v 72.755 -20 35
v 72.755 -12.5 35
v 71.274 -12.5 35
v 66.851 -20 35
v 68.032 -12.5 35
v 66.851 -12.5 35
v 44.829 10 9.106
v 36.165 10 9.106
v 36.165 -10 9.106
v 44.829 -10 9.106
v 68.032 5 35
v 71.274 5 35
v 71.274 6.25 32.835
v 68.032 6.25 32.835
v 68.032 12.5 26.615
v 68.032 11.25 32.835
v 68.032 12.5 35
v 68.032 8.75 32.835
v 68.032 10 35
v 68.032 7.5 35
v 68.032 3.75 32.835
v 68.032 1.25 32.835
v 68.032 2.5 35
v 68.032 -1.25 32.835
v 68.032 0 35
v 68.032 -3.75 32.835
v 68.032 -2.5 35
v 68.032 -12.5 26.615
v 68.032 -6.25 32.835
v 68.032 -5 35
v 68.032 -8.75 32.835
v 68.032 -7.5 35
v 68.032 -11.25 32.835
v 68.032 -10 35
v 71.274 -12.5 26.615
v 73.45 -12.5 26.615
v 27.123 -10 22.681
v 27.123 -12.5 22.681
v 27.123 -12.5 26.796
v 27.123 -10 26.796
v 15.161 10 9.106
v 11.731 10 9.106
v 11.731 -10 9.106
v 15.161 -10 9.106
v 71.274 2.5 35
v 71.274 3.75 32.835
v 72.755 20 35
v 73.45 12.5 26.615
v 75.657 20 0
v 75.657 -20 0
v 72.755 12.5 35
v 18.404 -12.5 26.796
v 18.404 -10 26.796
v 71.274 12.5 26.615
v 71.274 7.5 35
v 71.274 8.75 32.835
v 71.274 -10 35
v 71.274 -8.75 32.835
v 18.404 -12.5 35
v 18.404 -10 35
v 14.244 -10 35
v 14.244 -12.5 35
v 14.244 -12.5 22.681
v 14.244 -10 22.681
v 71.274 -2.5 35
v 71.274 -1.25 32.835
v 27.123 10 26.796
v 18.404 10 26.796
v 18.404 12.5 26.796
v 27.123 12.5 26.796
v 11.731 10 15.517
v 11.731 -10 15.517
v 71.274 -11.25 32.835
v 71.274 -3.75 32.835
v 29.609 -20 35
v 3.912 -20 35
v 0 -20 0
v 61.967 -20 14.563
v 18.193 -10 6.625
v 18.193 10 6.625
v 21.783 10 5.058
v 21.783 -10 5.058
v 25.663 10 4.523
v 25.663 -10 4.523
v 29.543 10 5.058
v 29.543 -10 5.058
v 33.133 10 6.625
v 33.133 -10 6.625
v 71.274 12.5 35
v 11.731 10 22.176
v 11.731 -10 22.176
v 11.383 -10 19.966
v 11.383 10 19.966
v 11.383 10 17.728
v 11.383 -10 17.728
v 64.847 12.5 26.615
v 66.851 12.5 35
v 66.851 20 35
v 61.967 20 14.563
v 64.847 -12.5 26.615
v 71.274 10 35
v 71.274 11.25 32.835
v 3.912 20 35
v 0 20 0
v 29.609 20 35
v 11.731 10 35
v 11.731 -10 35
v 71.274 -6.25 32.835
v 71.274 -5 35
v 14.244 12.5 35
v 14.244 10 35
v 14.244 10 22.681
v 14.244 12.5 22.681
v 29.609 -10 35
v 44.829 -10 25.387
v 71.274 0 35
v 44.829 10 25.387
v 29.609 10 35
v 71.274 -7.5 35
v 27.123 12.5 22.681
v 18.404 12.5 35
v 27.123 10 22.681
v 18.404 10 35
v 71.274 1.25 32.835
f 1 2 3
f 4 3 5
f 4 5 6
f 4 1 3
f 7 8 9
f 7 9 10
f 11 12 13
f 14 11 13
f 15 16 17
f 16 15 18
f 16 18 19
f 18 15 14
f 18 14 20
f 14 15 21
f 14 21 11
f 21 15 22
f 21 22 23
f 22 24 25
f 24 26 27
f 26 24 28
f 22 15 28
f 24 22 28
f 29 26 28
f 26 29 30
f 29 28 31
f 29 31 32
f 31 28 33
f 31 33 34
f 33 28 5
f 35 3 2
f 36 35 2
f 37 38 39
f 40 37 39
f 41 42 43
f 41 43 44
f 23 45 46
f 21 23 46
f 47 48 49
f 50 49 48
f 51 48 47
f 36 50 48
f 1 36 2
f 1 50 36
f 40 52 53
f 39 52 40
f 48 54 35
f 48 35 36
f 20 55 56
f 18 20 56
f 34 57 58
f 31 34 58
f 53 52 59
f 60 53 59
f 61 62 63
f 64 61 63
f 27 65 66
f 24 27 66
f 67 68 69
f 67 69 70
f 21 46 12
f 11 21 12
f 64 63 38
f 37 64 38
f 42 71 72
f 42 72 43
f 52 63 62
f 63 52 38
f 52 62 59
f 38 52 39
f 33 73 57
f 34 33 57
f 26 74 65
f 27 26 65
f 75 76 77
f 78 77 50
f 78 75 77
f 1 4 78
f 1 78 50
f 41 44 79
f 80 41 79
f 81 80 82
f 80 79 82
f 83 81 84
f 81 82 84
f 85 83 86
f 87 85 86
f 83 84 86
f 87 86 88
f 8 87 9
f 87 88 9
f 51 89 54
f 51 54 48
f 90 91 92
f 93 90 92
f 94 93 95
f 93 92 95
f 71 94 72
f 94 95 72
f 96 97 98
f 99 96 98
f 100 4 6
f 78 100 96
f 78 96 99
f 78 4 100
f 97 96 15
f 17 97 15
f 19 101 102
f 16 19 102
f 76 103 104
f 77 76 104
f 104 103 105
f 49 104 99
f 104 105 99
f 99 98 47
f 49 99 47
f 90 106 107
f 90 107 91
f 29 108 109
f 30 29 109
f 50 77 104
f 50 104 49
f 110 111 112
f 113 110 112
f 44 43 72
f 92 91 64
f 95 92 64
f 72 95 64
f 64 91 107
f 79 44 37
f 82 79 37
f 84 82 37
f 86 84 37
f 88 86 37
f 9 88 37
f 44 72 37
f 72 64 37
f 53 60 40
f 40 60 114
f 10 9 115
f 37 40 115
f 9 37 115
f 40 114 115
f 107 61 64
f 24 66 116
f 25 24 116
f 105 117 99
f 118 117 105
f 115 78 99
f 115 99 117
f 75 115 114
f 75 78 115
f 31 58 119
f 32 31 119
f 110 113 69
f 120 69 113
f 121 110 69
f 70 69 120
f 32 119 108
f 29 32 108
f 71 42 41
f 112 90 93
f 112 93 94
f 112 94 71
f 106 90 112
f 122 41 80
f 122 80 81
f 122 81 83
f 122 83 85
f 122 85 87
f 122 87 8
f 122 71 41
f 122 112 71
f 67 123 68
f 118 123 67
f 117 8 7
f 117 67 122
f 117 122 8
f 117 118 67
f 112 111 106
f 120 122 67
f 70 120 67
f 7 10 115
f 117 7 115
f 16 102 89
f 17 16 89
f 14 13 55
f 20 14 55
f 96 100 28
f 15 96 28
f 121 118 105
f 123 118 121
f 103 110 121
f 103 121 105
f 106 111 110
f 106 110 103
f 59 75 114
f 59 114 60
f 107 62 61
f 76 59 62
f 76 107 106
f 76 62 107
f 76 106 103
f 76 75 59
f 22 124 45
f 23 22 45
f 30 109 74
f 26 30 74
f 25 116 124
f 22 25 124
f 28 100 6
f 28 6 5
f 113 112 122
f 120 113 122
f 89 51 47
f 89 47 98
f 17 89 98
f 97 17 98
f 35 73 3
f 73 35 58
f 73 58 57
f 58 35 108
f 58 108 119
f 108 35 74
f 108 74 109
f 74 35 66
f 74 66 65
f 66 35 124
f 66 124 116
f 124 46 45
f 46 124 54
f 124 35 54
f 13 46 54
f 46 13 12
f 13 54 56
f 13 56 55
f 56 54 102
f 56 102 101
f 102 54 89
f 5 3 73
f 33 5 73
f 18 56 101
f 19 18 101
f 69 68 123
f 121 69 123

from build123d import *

# Parameters (mm, degrees)
F1_DEPTH = 20
F3_DEPTH = 10
F4_W     = 4.1598360986
F4_H     = 9.7989272326
F4_H_2   = 4.1150059551
F4_W_2   = 8.7187699974
F5_DEPTH = 12.5
F6_W     = 11.4290565252
F6_H     = 16.5465530008
F6_W_2   = 7.5056552887
F7_DEPTH = 12.5
F9_DEPTH = 10


with BuildPart() as f1:
    # F0 (on Front) → F1 (new body, symmetric)
    with BuildSketch(Plane.XZ):
        Polygon((3.9122919877, 35), (0, 0), (75.6573826075, 0), (72.7546669653, 35), (66.8505893794, 35), (61.9674493795, 14.5631379331), (29.6090823453, 35), align=None)
    extrude(amount=F1_DEPTH, both=True)

    # F2 (on Front) → F3 (cut, symmetric)
    with BuildSketch(Plane.XZ):
        with BuildLine():
            Line((44.829197228, 40.699031204), (11.7313470691, 40.699031204))
            Line((11.7313470691, 40.699031204), (11.7313470691, 22.1760364611))
            ThreePointArc((11.7313470691, 22.1760364611), (27.3392283785, 33.0721865907), (39.986979806, 18.8466310501))
            ThreePointArc((39.986979806, 18.8466310501), (38.9972583667, 13.6146205714), (36.1648645763, 9.1056264937))
            Line((36.1648645763, 9.1056264937), (44.829197228, 9.1056264937))
            Line((44.829197228, 9.1056264937), (44.829197228, 40.699031204))
        make_face()
        with BuildLine():
            ThreePointArc((39.986979806, 18.8466310501), (27.3392283785, 33.0721865907), (11.7313470691, 22.1760364611))
            Line((11.7313470691, 22.1760364611), (11.7313470691, 15.5172256391))
            ThreePointArc((11.7313470691, 15.5172256391), (13.032634994, 12.0901677157), (15.1611532505, 9.1056264937))
            Line((15.1611532505, 9.1056264937), (36.1648645763, 9.1056264937))
            ThreePointArc((36.1648645763, 9.1056264937), (38.9972583667, 13.6146205714), (39.986979806, 18.8466310501))
        make_face()
        with BuildLine():
            Line((11.7313470691, 15.5172256391), (11.7313470691, 22.1760364611))
            ThreePointArc((11.7313470691, 22.1760364611), (11.3390380208, 18.8466310501), (11.7313470691, 15.5172256391))
        make_face()
        with BuildLine():
            ThreePointArc((15.1611532505, 9.1056264937), (13.032634994, 12.0901677157), (11.7313470691, 15.5172256391))
            Line((11.7313470691, 15.5172256391), (11.7313470691, 9.1056264937))
            Line((11.7313470691, 9.1056264937), (15.1611532505, 9.1056264937))
        make_face()
        with BuildLine():
            ThreePointArc((15.1611532505, 9.1056264937), (25.6630089134, 4.5226601575), (36.1648645763, 9.1056264937))
            Line((36.1648645763, 9.1056264937), (15.1611532505, 9.1056264937))
        make_face()
    extrude(amount=F3_DEPTH, both=True, mode=Mode.SUBTRACT)

    # F4 (on Front) → F5 (cut, symmetric)
    with BuildSketch(Plane.XZ):
        with Locations((16.3239417598, 31.6951358691)):
            Rectangle(F4_W, F4_H)
        with Locations((16.3239417598, 24.7381692752)):
            Rectangle(F4_W, F4_H_2)
        with Locations((22.7632448077, 24.7381692752)):
            Rectangle(F4_W_2, F4_H_2)
    extrude(amount=F5_DEPTH, both=True, mode=Mode.SUBTRACT)

    # F6 (on Front) → F7 (cut, symmetric)
    with BuildSketch(Plane.XZ):
        with Locations((76.988093555, 34.8887415603)):
            Rectangle(F6_W, F6_H)
        with Locations((64.2796605825, 34.8887415603)):
            Rectangle(F6_W_2, F6_H)
    extrude(amount=F7_DEPTH, both=True, mode=Mode.SUBTRACT)

    # F8 (on face) → F9 (cut)
    with BuildSketch(Plane.YZ.offset(71.2735652924)):
        Polygon((-12.5068677589, 38.0216091871), (-12.5, 35), (-11.25, 32.8349364905), (-10, 35), (-8.75, 32.8349364905), (-7.5, 35), (-6.25, 32.8349364905), (-5, 35), (-3.75, 32.8349364905), (-2.5, 35), (-1.25, 32.8349364905), (0, 35), (1.25, 32.8349364905), (2.5, 35), (3.75, 32.8349364905), (5, 35), (6.25, 32.8349364905), (7.5, 35), (8.75, 32.8349364905), (10, 35), (11.25, 32.8349364905), (12.5, 35), (12.5, 38.0216091871), align=None)
    extrude(amount=-F9_DEPTH, mode=Mode.SUBTRACT)


solid = f1.part
